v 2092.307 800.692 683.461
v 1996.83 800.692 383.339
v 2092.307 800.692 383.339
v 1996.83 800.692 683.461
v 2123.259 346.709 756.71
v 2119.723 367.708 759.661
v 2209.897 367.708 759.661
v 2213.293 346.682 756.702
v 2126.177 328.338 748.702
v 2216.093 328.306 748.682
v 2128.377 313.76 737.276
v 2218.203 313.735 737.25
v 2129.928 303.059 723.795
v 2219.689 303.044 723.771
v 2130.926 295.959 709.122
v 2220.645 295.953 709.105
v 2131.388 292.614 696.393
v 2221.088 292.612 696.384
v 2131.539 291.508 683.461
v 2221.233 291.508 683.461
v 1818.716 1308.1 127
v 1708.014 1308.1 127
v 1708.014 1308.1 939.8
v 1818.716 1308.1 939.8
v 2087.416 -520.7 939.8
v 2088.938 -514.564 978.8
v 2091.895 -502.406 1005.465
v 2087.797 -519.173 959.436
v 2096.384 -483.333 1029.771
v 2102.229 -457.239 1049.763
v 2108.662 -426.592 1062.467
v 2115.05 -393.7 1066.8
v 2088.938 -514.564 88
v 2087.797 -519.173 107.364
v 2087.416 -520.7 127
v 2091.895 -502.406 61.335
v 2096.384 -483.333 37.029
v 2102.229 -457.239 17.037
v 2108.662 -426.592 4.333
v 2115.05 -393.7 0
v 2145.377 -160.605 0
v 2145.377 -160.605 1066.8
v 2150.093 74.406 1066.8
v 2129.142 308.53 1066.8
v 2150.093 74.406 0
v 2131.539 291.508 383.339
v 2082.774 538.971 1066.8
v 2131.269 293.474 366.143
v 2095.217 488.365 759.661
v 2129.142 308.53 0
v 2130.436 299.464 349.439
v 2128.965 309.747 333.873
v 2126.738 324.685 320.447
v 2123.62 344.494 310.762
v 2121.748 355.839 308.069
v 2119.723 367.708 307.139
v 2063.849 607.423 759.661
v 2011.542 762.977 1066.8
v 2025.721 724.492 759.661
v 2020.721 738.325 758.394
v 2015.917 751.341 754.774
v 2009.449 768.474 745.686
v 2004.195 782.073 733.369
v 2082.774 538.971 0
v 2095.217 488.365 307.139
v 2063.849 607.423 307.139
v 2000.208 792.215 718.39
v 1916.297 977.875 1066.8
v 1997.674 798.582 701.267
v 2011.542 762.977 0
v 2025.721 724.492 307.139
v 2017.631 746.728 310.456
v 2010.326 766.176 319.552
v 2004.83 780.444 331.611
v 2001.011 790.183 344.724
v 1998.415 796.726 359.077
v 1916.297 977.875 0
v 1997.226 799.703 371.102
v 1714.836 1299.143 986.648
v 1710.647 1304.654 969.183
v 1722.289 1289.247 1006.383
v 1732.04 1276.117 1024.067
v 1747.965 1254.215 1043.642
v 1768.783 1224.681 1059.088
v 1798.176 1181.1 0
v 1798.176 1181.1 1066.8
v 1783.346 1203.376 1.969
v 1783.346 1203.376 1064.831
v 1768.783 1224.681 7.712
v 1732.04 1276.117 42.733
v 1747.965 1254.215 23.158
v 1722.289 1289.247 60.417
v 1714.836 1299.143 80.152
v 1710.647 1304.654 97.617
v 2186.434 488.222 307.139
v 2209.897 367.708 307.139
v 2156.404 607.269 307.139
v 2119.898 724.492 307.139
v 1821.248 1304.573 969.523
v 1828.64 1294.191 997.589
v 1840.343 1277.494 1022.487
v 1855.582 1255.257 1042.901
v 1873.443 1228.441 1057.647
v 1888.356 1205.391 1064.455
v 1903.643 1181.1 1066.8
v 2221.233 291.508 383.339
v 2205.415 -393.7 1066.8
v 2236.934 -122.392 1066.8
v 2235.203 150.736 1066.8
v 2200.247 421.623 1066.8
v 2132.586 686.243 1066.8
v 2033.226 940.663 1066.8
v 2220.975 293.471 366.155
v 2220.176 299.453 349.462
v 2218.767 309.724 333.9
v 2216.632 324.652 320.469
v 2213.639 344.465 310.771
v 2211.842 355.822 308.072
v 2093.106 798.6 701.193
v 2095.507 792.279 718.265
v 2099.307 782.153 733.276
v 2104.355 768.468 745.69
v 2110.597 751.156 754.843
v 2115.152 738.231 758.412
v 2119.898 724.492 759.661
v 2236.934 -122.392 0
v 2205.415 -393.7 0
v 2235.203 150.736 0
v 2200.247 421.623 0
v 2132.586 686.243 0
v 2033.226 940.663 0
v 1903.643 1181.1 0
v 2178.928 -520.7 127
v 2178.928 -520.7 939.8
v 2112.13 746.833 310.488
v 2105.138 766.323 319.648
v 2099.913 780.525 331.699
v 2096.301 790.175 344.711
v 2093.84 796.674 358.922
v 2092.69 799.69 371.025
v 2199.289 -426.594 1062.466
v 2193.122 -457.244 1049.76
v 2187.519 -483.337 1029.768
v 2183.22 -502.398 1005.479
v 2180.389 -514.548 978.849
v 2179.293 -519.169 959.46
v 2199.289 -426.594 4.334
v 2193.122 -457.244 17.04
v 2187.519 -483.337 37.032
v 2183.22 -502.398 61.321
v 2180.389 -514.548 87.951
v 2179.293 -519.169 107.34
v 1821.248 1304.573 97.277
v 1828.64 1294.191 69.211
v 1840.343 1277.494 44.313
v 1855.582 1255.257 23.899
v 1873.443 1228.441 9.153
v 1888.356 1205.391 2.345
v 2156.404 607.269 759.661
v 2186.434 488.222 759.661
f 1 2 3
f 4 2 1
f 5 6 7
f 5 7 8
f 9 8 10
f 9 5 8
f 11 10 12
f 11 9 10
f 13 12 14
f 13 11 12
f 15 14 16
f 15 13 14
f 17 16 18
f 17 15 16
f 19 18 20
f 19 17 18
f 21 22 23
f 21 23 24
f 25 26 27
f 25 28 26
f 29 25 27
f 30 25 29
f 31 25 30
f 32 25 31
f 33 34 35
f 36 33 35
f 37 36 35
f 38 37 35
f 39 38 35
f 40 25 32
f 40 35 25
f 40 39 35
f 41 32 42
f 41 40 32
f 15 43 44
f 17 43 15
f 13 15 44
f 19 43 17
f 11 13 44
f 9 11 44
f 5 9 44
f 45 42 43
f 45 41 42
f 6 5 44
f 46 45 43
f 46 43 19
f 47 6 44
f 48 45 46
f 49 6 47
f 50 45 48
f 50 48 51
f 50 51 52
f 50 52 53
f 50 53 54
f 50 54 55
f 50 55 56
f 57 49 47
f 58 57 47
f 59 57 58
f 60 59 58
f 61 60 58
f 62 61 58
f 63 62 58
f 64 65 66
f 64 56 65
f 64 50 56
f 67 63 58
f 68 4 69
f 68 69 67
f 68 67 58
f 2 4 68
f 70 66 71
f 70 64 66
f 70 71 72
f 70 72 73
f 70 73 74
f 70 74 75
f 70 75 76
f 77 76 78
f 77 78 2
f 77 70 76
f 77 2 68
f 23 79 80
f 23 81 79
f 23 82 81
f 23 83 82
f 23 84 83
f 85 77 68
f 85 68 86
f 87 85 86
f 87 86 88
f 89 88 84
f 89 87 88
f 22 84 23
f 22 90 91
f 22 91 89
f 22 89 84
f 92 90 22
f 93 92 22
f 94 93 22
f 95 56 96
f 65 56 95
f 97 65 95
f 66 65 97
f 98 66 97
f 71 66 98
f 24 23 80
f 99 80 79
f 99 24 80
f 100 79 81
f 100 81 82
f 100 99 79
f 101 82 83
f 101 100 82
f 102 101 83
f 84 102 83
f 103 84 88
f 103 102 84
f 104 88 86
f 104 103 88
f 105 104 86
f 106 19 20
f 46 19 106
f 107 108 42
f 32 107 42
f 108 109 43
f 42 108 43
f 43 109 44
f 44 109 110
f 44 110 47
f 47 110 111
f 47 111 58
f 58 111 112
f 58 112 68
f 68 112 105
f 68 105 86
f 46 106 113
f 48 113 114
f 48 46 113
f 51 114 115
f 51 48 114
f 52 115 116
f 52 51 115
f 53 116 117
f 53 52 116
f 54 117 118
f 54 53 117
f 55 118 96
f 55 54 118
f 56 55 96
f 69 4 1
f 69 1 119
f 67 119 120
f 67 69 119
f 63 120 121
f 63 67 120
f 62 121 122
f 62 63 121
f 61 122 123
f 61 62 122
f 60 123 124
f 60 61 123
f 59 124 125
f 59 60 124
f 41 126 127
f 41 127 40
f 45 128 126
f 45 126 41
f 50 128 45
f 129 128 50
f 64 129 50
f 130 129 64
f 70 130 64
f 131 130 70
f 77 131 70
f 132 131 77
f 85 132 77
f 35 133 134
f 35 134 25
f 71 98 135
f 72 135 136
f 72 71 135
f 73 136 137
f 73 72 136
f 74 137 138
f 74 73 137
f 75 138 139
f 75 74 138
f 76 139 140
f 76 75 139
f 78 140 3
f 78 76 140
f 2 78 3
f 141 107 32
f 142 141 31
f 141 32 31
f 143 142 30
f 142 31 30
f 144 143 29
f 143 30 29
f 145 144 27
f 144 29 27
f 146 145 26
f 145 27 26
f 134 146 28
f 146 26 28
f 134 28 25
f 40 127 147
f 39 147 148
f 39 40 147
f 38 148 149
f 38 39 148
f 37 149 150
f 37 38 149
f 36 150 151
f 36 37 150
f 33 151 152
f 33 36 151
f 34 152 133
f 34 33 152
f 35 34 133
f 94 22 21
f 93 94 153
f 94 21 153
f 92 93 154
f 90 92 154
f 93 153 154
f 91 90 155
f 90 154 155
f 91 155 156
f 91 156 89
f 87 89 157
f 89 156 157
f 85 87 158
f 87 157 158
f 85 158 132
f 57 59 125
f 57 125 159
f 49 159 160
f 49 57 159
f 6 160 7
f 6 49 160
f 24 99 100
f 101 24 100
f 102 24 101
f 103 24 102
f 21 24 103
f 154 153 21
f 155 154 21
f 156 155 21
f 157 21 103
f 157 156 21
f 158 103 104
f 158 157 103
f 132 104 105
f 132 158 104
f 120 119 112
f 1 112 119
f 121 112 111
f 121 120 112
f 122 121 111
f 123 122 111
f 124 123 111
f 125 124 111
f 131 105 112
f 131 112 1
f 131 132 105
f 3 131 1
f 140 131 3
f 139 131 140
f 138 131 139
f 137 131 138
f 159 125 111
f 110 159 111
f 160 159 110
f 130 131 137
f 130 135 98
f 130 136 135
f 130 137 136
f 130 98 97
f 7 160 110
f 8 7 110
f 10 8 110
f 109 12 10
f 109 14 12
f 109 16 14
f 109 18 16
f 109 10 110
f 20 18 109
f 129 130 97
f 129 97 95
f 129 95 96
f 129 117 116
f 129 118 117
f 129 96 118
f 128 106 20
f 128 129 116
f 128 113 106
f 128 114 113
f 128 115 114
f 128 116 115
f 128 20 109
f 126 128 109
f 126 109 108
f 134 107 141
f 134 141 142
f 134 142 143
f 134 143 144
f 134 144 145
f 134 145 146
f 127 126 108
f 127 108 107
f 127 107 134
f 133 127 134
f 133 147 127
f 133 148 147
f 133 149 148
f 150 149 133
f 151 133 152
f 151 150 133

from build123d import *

# Parameters (mm, degrees)
BOSS_EXTRUDE2_DEPTH     = 1066.8
CUT_EXTRUDE1_DEPTH      = 2806.00308884
CUT_EXTRUDE1_DEPTH_BACK = 2806.00308884
FILLET1_R               = 127


with BuildPart() as part:
    # Sketch1 → Boss-Extrude2 (new body)
    with BuildSketch(Plane.XY):
        with BuildLine():
            Line((1708.013552171, 1308.1), (1818.71626935, 1308.1))
            ThreePointArc((1818.71626935, 1308.1), (2198.04838822, 432.940829033), (2178.927715276, -520.7))
            Line((2178.927715276, -520.7), (2087.416444891, -520.7))
            ThreePointArc((2087.416444891, -520.7), (2106.525474721, 437.019826496), (1708.013552171, 1308.1))
        make_face()
    extrude(amount=BOSS_EXTRUDE2_DEPTH)

    # Sketch2 → Cut-Extrude1 (cut, two sides: drawn at the far end of the back side and taken through both)
    with BuildSketch(Plane(origin=(0, 0, 0), x_dir=(0, 0, -1), z_dir=(1, 0, 0)).offset(-CUT_EXTRUDE1_DEPTH_BACK)):
        with BuildLine():
            Line((-683.460599828, 291.508156212), (-383.339400172, 291.508156212))
            ThreePointArc((-383.339400172, 291.508156212), (-329.457863446, 313.826619486), (-307.139400172, 367.708156212))
            Line((-307.139400172, 367.708156212), (-307.139400172, 724.491843788))
            ThreePointArc((-307.139400172, 724.491843788), (-329.457863446, 778.373380514), (-383.339400172, 800.691843788))
            Line((-383.339400172, 800.691843788), (-683.460599828, 800.691843788))
            ThreePointArc((-683.460599828, 800.691843788), (-737.342136554, 778.373380514), (-759.660599828, 724.491843788))
            Line((-759.660599828, 724.491843788), (-759.660599828, 367.708156212))
            ThreePointArc((-759.660599828, 367.708156212), (-737.342136554, 313.826619486), (-683.460599828, 291.508156212))
        make_face()
    extrude(amount=CUT_EXTRUDE1_DEPTH + CUT_EXTRUDE1_DEPTH_BACK, mode=Mode.SUBTRACT)

    # Fillet1
    fillet1_edges = [part.edges().sort_by_distance(p)[0] for p in [
        (2133.172080084, -520.7, 1066.8),
        (2133.172080084, -520.7, 0),
        (1763.364910761, 1308.1, 0),
        (1763.364910761, 1308.1, 1066.8),
    ]]
    fillet(fillet1_edges, radius=FILLET1_R)


solid = part.part
